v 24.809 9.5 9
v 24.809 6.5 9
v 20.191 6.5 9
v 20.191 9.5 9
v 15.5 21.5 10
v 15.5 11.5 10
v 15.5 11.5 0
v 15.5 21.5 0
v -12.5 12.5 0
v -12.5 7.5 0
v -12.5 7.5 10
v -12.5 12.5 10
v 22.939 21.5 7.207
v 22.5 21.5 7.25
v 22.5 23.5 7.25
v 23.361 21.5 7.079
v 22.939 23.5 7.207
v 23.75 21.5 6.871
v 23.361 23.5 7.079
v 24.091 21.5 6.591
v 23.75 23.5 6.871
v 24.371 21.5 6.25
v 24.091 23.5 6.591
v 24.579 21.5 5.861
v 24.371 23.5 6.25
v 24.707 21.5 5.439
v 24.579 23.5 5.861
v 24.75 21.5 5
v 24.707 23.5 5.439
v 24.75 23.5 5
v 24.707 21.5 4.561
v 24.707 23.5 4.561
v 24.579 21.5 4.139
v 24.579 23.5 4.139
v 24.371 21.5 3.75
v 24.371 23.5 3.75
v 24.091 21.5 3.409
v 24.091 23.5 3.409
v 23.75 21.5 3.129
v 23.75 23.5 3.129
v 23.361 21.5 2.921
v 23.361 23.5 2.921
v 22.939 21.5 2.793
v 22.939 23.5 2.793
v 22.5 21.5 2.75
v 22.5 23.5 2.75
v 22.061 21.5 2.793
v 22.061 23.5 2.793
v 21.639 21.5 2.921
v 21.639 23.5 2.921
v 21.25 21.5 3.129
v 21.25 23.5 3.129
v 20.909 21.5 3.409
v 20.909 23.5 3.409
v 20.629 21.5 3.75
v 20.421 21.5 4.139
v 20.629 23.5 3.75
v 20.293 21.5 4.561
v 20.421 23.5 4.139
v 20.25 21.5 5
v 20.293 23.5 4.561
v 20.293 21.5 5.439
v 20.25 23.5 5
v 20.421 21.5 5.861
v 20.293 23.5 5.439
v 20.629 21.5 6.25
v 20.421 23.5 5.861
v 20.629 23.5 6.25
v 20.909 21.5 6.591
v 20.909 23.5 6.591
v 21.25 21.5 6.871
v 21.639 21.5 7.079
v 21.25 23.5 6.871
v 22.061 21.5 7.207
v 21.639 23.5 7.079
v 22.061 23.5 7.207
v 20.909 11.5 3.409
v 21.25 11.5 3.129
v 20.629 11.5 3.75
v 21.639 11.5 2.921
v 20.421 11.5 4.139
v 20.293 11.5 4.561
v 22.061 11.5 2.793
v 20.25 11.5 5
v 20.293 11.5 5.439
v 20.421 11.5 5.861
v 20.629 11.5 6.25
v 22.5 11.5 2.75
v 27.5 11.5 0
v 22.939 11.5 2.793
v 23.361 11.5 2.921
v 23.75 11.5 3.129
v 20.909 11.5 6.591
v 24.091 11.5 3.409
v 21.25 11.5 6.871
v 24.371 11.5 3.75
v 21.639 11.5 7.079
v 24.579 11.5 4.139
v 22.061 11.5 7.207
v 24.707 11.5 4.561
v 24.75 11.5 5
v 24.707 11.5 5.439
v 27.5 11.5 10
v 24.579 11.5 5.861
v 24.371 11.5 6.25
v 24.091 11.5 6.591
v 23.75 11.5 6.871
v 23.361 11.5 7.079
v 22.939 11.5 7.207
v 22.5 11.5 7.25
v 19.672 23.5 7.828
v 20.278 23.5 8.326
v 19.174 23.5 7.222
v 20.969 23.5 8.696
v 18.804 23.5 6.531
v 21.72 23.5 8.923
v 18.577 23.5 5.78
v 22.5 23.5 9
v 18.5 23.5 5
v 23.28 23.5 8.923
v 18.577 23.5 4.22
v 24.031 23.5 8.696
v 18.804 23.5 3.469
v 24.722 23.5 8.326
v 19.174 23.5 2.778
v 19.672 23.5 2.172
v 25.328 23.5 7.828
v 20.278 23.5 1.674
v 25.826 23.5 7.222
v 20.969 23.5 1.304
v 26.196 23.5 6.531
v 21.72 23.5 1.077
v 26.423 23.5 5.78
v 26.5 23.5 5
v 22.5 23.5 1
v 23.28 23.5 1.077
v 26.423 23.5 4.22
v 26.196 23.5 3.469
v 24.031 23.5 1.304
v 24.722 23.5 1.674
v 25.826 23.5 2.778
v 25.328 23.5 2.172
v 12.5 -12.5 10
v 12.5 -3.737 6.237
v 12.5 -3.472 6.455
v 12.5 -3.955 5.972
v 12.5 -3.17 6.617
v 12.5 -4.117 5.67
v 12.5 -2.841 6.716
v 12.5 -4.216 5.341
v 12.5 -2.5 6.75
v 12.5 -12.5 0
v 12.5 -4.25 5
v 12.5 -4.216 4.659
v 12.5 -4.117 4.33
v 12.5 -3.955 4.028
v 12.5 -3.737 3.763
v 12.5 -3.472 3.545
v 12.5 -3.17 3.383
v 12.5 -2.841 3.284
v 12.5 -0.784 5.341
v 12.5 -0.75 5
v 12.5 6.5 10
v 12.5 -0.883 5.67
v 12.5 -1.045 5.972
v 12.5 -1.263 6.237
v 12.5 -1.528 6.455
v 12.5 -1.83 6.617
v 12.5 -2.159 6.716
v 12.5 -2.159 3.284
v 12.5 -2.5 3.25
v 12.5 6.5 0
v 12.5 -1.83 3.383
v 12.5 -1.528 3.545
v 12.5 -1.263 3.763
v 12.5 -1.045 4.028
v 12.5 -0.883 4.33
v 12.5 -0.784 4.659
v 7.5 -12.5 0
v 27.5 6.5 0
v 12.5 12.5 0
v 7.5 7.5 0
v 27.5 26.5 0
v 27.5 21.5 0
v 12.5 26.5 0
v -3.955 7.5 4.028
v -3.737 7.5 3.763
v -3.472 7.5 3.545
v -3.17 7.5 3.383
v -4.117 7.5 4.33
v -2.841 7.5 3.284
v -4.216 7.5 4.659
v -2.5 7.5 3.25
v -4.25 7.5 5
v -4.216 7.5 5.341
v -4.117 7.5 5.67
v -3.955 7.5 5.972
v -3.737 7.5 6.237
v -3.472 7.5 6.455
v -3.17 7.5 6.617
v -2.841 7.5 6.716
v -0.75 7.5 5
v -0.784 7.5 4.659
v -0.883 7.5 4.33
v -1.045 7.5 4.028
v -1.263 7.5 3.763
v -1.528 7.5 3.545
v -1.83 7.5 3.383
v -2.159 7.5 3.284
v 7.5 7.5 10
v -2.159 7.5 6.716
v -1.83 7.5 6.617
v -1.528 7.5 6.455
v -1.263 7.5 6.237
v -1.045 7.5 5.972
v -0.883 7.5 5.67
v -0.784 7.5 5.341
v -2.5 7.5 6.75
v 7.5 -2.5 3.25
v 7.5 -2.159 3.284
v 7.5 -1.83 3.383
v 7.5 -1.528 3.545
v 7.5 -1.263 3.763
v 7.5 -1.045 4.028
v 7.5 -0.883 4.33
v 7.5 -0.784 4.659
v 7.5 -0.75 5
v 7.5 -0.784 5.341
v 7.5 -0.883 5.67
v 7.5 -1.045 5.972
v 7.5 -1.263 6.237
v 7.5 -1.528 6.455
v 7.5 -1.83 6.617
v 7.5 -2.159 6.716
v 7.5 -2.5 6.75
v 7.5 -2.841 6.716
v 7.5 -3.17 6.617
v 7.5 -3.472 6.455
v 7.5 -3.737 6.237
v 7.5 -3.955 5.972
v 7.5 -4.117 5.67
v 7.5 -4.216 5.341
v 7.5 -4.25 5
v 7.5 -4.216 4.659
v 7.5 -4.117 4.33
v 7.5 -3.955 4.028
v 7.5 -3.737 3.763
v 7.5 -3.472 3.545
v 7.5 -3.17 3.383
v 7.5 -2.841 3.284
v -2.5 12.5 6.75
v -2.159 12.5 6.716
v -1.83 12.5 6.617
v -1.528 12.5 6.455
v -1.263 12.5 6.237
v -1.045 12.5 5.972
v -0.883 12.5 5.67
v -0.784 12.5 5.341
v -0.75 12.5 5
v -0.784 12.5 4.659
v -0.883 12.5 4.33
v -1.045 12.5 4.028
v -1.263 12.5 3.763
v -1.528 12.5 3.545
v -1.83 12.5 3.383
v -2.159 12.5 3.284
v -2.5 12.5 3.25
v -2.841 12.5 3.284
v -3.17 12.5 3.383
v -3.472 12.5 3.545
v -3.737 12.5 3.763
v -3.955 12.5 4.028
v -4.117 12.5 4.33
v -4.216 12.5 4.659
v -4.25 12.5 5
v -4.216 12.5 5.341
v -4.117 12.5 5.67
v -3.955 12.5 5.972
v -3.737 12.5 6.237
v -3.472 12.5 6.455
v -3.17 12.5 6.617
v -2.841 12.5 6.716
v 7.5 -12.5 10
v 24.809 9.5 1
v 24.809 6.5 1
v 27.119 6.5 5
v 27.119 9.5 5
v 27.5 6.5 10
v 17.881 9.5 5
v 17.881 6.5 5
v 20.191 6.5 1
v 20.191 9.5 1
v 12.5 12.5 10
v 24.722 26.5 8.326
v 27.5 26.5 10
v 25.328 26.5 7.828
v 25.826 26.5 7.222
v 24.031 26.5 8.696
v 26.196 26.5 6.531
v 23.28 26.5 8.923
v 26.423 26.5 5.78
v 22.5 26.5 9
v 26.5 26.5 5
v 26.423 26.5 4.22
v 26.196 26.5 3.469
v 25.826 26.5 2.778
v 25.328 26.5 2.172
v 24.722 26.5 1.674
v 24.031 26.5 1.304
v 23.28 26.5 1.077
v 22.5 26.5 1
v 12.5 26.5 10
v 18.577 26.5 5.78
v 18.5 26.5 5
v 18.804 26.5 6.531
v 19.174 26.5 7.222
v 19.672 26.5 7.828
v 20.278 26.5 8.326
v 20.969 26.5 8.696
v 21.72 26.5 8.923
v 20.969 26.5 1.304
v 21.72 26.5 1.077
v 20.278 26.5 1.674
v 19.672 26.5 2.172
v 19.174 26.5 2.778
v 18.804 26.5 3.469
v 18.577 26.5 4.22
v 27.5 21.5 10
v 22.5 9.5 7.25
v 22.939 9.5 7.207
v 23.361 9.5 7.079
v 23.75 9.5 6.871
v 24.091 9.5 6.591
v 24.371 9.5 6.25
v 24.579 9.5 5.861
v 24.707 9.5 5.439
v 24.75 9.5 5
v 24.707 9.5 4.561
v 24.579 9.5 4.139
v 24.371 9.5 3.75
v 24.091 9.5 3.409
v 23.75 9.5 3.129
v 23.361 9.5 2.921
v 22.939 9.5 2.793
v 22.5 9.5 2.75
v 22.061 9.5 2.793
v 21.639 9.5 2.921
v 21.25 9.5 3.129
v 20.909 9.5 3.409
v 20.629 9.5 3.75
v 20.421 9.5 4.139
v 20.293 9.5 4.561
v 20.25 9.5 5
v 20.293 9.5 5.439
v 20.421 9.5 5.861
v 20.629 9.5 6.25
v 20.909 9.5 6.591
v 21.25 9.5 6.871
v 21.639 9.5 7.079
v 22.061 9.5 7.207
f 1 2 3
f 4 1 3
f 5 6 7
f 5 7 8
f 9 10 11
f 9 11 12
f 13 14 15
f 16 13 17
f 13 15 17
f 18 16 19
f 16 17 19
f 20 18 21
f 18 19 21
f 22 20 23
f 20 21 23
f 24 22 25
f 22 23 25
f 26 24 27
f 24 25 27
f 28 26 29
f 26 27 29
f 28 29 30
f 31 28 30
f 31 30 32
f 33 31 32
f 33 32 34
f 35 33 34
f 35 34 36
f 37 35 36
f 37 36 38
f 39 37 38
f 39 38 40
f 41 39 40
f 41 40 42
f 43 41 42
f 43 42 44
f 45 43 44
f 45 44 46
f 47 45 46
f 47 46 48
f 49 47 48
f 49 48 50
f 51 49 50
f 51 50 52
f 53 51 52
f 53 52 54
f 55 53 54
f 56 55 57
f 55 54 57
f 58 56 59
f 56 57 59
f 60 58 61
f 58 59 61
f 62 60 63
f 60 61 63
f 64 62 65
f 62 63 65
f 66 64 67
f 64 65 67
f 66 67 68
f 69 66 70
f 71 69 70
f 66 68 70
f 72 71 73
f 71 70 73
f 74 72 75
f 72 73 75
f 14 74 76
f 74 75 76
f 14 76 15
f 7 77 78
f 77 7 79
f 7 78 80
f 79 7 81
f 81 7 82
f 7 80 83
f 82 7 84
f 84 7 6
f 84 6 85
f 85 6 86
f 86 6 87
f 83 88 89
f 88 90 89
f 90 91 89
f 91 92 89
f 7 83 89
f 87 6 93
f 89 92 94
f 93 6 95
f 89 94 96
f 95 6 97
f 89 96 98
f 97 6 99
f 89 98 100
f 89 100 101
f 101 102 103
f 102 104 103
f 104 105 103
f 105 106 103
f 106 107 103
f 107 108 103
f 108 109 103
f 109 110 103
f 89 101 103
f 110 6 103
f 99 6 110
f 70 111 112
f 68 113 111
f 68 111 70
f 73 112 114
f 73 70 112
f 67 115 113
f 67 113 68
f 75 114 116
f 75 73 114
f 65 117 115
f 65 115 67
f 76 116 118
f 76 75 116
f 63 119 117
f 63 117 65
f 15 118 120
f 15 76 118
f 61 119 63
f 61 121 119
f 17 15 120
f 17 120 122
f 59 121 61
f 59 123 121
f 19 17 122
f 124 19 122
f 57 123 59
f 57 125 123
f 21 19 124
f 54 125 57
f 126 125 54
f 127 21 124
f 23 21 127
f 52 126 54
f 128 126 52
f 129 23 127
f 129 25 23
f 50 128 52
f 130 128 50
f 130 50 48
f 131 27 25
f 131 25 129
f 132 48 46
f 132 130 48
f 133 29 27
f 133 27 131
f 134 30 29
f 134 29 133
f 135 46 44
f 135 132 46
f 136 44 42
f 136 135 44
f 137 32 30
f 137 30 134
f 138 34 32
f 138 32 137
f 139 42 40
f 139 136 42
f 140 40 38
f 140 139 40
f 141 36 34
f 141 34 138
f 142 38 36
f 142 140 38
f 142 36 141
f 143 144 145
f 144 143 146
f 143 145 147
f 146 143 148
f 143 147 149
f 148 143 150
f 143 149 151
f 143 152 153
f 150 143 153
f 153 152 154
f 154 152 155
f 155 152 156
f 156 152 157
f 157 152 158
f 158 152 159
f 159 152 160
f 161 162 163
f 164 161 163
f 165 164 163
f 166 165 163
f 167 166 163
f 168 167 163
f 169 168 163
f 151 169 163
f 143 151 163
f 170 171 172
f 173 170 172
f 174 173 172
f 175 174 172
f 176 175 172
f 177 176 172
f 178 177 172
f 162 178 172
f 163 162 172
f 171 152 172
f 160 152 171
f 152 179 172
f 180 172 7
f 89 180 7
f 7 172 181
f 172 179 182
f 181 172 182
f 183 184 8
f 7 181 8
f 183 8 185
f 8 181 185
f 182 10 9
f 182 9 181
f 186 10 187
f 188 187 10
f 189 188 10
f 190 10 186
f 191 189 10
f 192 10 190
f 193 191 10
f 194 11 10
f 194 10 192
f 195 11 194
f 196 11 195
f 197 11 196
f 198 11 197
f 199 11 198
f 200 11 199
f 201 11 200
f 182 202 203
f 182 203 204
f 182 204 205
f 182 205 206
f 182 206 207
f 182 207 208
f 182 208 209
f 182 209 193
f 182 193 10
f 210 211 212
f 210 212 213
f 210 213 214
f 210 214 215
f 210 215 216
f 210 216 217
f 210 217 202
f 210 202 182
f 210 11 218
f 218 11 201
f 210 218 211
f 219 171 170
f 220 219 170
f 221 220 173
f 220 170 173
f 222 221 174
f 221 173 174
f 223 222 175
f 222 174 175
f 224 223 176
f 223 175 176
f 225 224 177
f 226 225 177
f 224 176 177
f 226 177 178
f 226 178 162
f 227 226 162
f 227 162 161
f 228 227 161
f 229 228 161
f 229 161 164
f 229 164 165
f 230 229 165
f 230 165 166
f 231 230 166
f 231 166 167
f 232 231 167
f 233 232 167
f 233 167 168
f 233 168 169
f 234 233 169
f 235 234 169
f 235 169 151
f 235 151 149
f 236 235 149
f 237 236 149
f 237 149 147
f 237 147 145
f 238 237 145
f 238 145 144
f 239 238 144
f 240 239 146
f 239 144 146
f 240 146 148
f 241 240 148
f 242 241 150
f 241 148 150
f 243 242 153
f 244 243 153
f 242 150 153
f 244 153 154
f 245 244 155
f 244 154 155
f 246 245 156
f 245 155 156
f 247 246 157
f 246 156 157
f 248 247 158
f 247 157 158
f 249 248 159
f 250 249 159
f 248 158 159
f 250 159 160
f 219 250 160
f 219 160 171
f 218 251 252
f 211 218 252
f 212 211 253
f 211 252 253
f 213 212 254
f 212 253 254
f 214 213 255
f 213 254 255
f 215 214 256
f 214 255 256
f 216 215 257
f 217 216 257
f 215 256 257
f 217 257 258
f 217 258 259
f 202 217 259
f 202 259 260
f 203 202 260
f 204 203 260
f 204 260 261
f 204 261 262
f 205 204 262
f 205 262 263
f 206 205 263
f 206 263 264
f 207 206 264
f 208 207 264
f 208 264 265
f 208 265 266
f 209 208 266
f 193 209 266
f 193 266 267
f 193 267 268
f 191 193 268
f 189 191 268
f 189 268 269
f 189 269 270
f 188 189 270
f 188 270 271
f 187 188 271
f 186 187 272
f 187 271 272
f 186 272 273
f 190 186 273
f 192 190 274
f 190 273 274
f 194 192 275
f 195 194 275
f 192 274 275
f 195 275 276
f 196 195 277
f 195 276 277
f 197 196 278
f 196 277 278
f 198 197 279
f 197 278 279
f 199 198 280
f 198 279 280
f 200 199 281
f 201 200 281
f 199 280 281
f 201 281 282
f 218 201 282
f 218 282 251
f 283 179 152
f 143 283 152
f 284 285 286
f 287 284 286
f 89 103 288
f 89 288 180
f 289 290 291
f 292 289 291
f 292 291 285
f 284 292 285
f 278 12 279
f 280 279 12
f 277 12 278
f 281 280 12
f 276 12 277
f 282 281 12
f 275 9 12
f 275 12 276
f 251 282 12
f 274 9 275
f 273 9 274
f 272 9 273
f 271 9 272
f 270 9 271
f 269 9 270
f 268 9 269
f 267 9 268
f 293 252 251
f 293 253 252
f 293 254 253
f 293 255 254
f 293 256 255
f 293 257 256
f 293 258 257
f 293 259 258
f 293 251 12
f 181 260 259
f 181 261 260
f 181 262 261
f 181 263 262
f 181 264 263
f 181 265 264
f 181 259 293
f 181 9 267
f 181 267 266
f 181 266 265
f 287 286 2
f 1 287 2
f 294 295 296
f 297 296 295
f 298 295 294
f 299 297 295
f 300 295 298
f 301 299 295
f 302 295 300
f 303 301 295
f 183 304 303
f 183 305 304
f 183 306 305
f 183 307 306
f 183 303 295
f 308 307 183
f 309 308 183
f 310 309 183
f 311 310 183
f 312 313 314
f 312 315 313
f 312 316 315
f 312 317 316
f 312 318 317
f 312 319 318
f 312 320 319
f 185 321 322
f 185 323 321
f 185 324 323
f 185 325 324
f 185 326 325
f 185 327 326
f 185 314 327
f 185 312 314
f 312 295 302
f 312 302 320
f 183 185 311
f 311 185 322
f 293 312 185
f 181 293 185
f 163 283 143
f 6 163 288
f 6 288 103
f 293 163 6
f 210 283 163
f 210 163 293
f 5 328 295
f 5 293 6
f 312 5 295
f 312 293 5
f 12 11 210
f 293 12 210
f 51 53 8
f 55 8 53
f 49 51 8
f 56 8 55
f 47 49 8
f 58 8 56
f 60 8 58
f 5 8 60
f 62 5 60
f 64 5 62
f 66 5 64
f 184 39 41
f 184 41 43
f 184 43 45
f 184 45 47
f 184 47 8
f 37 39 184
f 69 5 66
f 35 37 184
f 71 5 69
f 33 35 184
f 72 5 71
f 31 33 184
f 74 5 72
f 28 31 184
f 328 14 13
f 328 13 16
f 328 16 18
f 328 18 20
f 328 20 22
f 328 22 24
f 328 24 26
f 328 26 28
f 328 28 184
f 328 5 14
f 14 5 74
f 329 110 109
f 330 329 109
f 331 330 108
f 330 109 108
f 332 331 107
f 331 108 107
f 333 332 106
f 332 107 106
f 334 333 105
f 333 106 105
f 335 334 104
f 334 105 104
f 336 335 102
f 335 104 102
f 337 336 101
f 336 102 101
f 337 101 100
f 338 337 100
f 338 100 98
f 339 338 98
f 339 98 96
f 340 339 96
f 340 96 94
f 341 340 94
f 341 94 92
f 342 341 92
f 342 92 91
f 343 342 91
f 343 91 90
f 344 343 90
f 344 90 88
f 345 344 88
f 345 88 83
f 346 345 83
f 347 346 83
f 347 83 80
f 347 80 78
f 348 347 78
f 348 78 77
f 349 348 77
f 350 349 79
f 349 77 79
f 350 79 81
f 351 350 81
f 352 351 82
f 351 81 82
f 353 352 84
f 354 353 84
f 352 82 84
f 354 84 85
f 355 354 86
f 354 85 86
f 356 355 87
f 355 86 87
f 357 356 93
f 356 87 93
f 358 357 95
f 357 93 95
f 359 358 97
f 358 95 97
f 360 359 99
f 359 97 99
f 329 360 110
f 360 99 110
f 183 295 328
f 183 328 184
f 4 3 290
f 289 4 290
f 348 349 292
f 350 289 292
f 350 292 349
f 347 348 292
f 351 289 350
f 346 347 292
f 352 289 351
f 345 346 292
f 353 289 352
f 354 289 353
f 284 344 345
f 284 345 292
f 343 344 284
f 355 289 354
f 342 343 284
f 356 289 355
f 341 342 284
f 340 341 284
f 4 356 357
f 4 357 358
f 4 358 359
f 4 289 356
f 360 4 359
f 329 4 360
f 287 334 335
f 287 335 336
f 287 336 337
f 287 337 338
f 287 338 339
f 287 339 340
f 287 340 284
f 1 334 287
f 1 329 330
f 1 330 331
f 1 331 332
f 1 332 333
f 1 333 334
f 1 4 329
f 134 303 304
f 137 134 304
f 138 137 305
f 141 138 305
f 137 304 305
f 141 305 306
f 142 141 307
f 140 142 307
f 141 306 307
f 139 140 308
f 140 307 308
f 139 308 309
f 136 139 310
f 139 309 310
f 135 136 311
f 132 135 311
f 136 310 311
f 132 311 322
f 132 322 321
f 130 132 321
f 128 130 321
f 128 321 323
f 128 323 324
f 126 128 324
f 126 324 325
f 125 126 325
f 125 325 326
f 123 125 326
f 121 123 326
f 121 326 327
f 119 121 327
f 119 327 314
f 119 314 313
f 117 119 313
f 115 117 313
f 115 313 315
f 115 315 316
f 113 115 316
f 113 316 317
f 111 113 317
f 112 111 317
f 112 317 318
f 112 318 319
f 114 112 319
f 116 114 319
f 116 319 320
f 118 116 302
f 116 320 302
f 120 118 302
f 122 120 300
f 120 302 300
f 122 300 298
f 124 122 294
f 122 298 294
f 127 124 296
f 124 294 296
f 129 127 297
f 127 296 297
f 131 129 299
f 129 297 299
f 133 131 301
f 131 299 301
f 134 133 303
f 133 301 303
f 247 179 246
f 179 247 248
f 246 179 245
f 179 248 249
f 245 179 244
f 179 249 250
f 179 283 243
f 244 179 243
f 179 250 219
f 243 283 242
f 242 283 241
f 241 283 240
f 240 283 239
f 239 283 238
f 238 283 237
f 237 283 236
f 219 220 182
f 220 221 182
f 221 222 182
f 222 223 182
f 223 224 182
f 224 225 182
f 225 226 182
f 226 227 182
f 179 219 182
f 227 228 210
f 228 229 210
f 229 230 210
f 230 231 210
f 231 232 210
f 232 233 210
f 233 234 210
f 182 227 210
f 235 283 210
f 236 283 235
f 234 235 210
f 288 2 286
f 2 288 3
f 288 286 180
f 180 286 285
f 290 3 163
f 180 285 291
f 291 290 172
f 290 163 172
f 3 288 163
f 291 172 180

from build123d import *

# Parameters (mm, degrees)
SKETCH2_W                                           = 25
SKETCH2_H                                           = 25
BOSS_EXTRUDE1_DEPTH                                 = 10
SKETCH3_W                                           = 20
SKETCH3_H                                           = 20
CUT_EXTRUDE1_DEPTH                                  = 21.310096012
SKETCH5_W                                           = 10
SKETCH5_H                                           = 20
BOSS_EXTRUDE2_DEPTH                                 = 15
SKETCH7_W                                           = 12
SKETCH7_H                                           = 10
CUT_EXTRUDE2_DEPTH                                  = 40.477841886
SKETCH8_R                                           = 2.25
CUT_EXTRUDE3_DEPTH                                  = 49.757050772
SKETCH9_R                                           = 1.75
CUT_EXTRUDE4_DEPTH                                  = 15
SKETCH10_R                                          = 1.75
CUT_EXTRUDE5_DEPTH                                  = 15
CBORE_FOR_M4_HEX_SOCKET_HEAD_CAP_SCREW1_D           = 4.5
CBORE_FOR_M4_HEX_SOCKET_HEAD_CAP_SCREW1_CBORE_D     = 8
CBORE_FOR_M4_HEX_SOCKET_HEAD_CAP_SCREW1_CBORE_DEPTH = 3
CUT_EXTRUDE6_DEPTH                                  = 3


with BuildPart() as part:
    # Sketch2 → Boss-Extrude1 (new body)
    with BuildSketch(Plane.XY):
        Rectangle(SKETCH2_W, SKETCH2_H)
    extrude(amount=BOSS_EXTRUDE1_DEPTH)

    # Sketch3 → Cut-Extrude1 (cut, through all)
    with BuildSketch(Plane.XY.offset(10)):
        with Locations((-2.5, -2.5)):
            Rectangle(SKETCH3_W, SKETCH3_H)
    extrude(amount=-CUT_EXTRUDE1_DEPTH, mode=Mode.SUBTRACT)

    # Sketch5 → Boss-Extrude2 (add)
    with BuildSketch(Plane(origin=(12.5, 0, 0), x_dir=(0, 0, -1), z_dir=(1, 0, 0))):
        with Locations((-5, 16.5)):
            Rectangle(SKETCH5_W, SKETCH5_H)
    extrude(amount=BOSS_EXTRUDE2_DEPTH)

    # Sketch7 → Cut-Extrude2 (cut, through all)
    with BuildSketch(Plane.XY.offset(10)):
        with Locations((21.5, 16.5)):
            Rectangle(SKETCH7_W, SKETCH7_H)
    extrude(amount=-CUT_EXTRUDE2_DEPTH, mode=Mode.SUBTRACT)

    # Sketch8 → Cut-Extrude3 (cut, through all)
    with BuildSketch(Plane(origin=(0, 26.5, 0), x_dir=(1, 0, 0), z_dir=(0, 1, 0))):
        with Locations(Location((22.5, -5, 0), (0, 0, 270))):
            Circle(SKETCH8_R)
    extrude(amount=-CUT_EXTRUDE3_DEPTH, mode=Mode.SUBTRACT)

    # Sketch9 → Cut-Extrude4 (cut)
    with BuildSketch(Plane(origin=(0, 12.5, 0), x_dir=(1, 0, 0), z_dir=(0, 1, 0))):
        with Locations(Location((-2.5, -5, 0), (0, 0, 270))):
            Circle(SKETCH9_R)
    extrude(amount=-CUT_EXTRUDE4_DEPTH, mode=Mode.SUBTRACT)

    # Sketch10 → Cut-Extrude5 (cut)
    with BuildSketch(Plane(origin=(12.5, 0, 0), x_dir=(0, 0, -1), z_dir=(1, 0, 0))):
        with Locations((-5, -2.5)):
            Circle(SKETCH10_R)
    extrude(amount=-CUT_EXTRUDE5_DEPTH, mode=Mode.SUBTRACT)

    # CBORE for M4 Hex Socket Head Cap Screw1 (through all)
    with Locations(Plane(origin=(0, 26.5, 0), x_dir=(1, 0, 0), z_dir=(0, 1, 0))):
        with Locations((22.5, -5)):
            CounterBoreHole(CBORE_FOR_M4_HEX_SOCKET_HEAD_CAP_SCREW1_D / 2, CBORE_FOR_M4_HEX_SOCKET_HEAD_CAP_SCREW1_CBORE_D / 2, CBORE_FOR_M4_HEX_SOCKET_HEAD_CAP_SCREW1_CBORE_DEPTH)

    # Sketch13 → Cut-Extrude6 (cut)
    with BuildSketch(Plane.XZ.offset(-6.5)):
        Polygon((17.881197846, 5), (20.190598923, 1), (24.809401077, 1), (27.118802154, 5), (24.809401077, 9), (20.190598923, 9), align=None)
    extrude(amount=-CUT_EXTRUDE6_DEPTH, mode=Mode.SUBTRACT)


solid = part.part
